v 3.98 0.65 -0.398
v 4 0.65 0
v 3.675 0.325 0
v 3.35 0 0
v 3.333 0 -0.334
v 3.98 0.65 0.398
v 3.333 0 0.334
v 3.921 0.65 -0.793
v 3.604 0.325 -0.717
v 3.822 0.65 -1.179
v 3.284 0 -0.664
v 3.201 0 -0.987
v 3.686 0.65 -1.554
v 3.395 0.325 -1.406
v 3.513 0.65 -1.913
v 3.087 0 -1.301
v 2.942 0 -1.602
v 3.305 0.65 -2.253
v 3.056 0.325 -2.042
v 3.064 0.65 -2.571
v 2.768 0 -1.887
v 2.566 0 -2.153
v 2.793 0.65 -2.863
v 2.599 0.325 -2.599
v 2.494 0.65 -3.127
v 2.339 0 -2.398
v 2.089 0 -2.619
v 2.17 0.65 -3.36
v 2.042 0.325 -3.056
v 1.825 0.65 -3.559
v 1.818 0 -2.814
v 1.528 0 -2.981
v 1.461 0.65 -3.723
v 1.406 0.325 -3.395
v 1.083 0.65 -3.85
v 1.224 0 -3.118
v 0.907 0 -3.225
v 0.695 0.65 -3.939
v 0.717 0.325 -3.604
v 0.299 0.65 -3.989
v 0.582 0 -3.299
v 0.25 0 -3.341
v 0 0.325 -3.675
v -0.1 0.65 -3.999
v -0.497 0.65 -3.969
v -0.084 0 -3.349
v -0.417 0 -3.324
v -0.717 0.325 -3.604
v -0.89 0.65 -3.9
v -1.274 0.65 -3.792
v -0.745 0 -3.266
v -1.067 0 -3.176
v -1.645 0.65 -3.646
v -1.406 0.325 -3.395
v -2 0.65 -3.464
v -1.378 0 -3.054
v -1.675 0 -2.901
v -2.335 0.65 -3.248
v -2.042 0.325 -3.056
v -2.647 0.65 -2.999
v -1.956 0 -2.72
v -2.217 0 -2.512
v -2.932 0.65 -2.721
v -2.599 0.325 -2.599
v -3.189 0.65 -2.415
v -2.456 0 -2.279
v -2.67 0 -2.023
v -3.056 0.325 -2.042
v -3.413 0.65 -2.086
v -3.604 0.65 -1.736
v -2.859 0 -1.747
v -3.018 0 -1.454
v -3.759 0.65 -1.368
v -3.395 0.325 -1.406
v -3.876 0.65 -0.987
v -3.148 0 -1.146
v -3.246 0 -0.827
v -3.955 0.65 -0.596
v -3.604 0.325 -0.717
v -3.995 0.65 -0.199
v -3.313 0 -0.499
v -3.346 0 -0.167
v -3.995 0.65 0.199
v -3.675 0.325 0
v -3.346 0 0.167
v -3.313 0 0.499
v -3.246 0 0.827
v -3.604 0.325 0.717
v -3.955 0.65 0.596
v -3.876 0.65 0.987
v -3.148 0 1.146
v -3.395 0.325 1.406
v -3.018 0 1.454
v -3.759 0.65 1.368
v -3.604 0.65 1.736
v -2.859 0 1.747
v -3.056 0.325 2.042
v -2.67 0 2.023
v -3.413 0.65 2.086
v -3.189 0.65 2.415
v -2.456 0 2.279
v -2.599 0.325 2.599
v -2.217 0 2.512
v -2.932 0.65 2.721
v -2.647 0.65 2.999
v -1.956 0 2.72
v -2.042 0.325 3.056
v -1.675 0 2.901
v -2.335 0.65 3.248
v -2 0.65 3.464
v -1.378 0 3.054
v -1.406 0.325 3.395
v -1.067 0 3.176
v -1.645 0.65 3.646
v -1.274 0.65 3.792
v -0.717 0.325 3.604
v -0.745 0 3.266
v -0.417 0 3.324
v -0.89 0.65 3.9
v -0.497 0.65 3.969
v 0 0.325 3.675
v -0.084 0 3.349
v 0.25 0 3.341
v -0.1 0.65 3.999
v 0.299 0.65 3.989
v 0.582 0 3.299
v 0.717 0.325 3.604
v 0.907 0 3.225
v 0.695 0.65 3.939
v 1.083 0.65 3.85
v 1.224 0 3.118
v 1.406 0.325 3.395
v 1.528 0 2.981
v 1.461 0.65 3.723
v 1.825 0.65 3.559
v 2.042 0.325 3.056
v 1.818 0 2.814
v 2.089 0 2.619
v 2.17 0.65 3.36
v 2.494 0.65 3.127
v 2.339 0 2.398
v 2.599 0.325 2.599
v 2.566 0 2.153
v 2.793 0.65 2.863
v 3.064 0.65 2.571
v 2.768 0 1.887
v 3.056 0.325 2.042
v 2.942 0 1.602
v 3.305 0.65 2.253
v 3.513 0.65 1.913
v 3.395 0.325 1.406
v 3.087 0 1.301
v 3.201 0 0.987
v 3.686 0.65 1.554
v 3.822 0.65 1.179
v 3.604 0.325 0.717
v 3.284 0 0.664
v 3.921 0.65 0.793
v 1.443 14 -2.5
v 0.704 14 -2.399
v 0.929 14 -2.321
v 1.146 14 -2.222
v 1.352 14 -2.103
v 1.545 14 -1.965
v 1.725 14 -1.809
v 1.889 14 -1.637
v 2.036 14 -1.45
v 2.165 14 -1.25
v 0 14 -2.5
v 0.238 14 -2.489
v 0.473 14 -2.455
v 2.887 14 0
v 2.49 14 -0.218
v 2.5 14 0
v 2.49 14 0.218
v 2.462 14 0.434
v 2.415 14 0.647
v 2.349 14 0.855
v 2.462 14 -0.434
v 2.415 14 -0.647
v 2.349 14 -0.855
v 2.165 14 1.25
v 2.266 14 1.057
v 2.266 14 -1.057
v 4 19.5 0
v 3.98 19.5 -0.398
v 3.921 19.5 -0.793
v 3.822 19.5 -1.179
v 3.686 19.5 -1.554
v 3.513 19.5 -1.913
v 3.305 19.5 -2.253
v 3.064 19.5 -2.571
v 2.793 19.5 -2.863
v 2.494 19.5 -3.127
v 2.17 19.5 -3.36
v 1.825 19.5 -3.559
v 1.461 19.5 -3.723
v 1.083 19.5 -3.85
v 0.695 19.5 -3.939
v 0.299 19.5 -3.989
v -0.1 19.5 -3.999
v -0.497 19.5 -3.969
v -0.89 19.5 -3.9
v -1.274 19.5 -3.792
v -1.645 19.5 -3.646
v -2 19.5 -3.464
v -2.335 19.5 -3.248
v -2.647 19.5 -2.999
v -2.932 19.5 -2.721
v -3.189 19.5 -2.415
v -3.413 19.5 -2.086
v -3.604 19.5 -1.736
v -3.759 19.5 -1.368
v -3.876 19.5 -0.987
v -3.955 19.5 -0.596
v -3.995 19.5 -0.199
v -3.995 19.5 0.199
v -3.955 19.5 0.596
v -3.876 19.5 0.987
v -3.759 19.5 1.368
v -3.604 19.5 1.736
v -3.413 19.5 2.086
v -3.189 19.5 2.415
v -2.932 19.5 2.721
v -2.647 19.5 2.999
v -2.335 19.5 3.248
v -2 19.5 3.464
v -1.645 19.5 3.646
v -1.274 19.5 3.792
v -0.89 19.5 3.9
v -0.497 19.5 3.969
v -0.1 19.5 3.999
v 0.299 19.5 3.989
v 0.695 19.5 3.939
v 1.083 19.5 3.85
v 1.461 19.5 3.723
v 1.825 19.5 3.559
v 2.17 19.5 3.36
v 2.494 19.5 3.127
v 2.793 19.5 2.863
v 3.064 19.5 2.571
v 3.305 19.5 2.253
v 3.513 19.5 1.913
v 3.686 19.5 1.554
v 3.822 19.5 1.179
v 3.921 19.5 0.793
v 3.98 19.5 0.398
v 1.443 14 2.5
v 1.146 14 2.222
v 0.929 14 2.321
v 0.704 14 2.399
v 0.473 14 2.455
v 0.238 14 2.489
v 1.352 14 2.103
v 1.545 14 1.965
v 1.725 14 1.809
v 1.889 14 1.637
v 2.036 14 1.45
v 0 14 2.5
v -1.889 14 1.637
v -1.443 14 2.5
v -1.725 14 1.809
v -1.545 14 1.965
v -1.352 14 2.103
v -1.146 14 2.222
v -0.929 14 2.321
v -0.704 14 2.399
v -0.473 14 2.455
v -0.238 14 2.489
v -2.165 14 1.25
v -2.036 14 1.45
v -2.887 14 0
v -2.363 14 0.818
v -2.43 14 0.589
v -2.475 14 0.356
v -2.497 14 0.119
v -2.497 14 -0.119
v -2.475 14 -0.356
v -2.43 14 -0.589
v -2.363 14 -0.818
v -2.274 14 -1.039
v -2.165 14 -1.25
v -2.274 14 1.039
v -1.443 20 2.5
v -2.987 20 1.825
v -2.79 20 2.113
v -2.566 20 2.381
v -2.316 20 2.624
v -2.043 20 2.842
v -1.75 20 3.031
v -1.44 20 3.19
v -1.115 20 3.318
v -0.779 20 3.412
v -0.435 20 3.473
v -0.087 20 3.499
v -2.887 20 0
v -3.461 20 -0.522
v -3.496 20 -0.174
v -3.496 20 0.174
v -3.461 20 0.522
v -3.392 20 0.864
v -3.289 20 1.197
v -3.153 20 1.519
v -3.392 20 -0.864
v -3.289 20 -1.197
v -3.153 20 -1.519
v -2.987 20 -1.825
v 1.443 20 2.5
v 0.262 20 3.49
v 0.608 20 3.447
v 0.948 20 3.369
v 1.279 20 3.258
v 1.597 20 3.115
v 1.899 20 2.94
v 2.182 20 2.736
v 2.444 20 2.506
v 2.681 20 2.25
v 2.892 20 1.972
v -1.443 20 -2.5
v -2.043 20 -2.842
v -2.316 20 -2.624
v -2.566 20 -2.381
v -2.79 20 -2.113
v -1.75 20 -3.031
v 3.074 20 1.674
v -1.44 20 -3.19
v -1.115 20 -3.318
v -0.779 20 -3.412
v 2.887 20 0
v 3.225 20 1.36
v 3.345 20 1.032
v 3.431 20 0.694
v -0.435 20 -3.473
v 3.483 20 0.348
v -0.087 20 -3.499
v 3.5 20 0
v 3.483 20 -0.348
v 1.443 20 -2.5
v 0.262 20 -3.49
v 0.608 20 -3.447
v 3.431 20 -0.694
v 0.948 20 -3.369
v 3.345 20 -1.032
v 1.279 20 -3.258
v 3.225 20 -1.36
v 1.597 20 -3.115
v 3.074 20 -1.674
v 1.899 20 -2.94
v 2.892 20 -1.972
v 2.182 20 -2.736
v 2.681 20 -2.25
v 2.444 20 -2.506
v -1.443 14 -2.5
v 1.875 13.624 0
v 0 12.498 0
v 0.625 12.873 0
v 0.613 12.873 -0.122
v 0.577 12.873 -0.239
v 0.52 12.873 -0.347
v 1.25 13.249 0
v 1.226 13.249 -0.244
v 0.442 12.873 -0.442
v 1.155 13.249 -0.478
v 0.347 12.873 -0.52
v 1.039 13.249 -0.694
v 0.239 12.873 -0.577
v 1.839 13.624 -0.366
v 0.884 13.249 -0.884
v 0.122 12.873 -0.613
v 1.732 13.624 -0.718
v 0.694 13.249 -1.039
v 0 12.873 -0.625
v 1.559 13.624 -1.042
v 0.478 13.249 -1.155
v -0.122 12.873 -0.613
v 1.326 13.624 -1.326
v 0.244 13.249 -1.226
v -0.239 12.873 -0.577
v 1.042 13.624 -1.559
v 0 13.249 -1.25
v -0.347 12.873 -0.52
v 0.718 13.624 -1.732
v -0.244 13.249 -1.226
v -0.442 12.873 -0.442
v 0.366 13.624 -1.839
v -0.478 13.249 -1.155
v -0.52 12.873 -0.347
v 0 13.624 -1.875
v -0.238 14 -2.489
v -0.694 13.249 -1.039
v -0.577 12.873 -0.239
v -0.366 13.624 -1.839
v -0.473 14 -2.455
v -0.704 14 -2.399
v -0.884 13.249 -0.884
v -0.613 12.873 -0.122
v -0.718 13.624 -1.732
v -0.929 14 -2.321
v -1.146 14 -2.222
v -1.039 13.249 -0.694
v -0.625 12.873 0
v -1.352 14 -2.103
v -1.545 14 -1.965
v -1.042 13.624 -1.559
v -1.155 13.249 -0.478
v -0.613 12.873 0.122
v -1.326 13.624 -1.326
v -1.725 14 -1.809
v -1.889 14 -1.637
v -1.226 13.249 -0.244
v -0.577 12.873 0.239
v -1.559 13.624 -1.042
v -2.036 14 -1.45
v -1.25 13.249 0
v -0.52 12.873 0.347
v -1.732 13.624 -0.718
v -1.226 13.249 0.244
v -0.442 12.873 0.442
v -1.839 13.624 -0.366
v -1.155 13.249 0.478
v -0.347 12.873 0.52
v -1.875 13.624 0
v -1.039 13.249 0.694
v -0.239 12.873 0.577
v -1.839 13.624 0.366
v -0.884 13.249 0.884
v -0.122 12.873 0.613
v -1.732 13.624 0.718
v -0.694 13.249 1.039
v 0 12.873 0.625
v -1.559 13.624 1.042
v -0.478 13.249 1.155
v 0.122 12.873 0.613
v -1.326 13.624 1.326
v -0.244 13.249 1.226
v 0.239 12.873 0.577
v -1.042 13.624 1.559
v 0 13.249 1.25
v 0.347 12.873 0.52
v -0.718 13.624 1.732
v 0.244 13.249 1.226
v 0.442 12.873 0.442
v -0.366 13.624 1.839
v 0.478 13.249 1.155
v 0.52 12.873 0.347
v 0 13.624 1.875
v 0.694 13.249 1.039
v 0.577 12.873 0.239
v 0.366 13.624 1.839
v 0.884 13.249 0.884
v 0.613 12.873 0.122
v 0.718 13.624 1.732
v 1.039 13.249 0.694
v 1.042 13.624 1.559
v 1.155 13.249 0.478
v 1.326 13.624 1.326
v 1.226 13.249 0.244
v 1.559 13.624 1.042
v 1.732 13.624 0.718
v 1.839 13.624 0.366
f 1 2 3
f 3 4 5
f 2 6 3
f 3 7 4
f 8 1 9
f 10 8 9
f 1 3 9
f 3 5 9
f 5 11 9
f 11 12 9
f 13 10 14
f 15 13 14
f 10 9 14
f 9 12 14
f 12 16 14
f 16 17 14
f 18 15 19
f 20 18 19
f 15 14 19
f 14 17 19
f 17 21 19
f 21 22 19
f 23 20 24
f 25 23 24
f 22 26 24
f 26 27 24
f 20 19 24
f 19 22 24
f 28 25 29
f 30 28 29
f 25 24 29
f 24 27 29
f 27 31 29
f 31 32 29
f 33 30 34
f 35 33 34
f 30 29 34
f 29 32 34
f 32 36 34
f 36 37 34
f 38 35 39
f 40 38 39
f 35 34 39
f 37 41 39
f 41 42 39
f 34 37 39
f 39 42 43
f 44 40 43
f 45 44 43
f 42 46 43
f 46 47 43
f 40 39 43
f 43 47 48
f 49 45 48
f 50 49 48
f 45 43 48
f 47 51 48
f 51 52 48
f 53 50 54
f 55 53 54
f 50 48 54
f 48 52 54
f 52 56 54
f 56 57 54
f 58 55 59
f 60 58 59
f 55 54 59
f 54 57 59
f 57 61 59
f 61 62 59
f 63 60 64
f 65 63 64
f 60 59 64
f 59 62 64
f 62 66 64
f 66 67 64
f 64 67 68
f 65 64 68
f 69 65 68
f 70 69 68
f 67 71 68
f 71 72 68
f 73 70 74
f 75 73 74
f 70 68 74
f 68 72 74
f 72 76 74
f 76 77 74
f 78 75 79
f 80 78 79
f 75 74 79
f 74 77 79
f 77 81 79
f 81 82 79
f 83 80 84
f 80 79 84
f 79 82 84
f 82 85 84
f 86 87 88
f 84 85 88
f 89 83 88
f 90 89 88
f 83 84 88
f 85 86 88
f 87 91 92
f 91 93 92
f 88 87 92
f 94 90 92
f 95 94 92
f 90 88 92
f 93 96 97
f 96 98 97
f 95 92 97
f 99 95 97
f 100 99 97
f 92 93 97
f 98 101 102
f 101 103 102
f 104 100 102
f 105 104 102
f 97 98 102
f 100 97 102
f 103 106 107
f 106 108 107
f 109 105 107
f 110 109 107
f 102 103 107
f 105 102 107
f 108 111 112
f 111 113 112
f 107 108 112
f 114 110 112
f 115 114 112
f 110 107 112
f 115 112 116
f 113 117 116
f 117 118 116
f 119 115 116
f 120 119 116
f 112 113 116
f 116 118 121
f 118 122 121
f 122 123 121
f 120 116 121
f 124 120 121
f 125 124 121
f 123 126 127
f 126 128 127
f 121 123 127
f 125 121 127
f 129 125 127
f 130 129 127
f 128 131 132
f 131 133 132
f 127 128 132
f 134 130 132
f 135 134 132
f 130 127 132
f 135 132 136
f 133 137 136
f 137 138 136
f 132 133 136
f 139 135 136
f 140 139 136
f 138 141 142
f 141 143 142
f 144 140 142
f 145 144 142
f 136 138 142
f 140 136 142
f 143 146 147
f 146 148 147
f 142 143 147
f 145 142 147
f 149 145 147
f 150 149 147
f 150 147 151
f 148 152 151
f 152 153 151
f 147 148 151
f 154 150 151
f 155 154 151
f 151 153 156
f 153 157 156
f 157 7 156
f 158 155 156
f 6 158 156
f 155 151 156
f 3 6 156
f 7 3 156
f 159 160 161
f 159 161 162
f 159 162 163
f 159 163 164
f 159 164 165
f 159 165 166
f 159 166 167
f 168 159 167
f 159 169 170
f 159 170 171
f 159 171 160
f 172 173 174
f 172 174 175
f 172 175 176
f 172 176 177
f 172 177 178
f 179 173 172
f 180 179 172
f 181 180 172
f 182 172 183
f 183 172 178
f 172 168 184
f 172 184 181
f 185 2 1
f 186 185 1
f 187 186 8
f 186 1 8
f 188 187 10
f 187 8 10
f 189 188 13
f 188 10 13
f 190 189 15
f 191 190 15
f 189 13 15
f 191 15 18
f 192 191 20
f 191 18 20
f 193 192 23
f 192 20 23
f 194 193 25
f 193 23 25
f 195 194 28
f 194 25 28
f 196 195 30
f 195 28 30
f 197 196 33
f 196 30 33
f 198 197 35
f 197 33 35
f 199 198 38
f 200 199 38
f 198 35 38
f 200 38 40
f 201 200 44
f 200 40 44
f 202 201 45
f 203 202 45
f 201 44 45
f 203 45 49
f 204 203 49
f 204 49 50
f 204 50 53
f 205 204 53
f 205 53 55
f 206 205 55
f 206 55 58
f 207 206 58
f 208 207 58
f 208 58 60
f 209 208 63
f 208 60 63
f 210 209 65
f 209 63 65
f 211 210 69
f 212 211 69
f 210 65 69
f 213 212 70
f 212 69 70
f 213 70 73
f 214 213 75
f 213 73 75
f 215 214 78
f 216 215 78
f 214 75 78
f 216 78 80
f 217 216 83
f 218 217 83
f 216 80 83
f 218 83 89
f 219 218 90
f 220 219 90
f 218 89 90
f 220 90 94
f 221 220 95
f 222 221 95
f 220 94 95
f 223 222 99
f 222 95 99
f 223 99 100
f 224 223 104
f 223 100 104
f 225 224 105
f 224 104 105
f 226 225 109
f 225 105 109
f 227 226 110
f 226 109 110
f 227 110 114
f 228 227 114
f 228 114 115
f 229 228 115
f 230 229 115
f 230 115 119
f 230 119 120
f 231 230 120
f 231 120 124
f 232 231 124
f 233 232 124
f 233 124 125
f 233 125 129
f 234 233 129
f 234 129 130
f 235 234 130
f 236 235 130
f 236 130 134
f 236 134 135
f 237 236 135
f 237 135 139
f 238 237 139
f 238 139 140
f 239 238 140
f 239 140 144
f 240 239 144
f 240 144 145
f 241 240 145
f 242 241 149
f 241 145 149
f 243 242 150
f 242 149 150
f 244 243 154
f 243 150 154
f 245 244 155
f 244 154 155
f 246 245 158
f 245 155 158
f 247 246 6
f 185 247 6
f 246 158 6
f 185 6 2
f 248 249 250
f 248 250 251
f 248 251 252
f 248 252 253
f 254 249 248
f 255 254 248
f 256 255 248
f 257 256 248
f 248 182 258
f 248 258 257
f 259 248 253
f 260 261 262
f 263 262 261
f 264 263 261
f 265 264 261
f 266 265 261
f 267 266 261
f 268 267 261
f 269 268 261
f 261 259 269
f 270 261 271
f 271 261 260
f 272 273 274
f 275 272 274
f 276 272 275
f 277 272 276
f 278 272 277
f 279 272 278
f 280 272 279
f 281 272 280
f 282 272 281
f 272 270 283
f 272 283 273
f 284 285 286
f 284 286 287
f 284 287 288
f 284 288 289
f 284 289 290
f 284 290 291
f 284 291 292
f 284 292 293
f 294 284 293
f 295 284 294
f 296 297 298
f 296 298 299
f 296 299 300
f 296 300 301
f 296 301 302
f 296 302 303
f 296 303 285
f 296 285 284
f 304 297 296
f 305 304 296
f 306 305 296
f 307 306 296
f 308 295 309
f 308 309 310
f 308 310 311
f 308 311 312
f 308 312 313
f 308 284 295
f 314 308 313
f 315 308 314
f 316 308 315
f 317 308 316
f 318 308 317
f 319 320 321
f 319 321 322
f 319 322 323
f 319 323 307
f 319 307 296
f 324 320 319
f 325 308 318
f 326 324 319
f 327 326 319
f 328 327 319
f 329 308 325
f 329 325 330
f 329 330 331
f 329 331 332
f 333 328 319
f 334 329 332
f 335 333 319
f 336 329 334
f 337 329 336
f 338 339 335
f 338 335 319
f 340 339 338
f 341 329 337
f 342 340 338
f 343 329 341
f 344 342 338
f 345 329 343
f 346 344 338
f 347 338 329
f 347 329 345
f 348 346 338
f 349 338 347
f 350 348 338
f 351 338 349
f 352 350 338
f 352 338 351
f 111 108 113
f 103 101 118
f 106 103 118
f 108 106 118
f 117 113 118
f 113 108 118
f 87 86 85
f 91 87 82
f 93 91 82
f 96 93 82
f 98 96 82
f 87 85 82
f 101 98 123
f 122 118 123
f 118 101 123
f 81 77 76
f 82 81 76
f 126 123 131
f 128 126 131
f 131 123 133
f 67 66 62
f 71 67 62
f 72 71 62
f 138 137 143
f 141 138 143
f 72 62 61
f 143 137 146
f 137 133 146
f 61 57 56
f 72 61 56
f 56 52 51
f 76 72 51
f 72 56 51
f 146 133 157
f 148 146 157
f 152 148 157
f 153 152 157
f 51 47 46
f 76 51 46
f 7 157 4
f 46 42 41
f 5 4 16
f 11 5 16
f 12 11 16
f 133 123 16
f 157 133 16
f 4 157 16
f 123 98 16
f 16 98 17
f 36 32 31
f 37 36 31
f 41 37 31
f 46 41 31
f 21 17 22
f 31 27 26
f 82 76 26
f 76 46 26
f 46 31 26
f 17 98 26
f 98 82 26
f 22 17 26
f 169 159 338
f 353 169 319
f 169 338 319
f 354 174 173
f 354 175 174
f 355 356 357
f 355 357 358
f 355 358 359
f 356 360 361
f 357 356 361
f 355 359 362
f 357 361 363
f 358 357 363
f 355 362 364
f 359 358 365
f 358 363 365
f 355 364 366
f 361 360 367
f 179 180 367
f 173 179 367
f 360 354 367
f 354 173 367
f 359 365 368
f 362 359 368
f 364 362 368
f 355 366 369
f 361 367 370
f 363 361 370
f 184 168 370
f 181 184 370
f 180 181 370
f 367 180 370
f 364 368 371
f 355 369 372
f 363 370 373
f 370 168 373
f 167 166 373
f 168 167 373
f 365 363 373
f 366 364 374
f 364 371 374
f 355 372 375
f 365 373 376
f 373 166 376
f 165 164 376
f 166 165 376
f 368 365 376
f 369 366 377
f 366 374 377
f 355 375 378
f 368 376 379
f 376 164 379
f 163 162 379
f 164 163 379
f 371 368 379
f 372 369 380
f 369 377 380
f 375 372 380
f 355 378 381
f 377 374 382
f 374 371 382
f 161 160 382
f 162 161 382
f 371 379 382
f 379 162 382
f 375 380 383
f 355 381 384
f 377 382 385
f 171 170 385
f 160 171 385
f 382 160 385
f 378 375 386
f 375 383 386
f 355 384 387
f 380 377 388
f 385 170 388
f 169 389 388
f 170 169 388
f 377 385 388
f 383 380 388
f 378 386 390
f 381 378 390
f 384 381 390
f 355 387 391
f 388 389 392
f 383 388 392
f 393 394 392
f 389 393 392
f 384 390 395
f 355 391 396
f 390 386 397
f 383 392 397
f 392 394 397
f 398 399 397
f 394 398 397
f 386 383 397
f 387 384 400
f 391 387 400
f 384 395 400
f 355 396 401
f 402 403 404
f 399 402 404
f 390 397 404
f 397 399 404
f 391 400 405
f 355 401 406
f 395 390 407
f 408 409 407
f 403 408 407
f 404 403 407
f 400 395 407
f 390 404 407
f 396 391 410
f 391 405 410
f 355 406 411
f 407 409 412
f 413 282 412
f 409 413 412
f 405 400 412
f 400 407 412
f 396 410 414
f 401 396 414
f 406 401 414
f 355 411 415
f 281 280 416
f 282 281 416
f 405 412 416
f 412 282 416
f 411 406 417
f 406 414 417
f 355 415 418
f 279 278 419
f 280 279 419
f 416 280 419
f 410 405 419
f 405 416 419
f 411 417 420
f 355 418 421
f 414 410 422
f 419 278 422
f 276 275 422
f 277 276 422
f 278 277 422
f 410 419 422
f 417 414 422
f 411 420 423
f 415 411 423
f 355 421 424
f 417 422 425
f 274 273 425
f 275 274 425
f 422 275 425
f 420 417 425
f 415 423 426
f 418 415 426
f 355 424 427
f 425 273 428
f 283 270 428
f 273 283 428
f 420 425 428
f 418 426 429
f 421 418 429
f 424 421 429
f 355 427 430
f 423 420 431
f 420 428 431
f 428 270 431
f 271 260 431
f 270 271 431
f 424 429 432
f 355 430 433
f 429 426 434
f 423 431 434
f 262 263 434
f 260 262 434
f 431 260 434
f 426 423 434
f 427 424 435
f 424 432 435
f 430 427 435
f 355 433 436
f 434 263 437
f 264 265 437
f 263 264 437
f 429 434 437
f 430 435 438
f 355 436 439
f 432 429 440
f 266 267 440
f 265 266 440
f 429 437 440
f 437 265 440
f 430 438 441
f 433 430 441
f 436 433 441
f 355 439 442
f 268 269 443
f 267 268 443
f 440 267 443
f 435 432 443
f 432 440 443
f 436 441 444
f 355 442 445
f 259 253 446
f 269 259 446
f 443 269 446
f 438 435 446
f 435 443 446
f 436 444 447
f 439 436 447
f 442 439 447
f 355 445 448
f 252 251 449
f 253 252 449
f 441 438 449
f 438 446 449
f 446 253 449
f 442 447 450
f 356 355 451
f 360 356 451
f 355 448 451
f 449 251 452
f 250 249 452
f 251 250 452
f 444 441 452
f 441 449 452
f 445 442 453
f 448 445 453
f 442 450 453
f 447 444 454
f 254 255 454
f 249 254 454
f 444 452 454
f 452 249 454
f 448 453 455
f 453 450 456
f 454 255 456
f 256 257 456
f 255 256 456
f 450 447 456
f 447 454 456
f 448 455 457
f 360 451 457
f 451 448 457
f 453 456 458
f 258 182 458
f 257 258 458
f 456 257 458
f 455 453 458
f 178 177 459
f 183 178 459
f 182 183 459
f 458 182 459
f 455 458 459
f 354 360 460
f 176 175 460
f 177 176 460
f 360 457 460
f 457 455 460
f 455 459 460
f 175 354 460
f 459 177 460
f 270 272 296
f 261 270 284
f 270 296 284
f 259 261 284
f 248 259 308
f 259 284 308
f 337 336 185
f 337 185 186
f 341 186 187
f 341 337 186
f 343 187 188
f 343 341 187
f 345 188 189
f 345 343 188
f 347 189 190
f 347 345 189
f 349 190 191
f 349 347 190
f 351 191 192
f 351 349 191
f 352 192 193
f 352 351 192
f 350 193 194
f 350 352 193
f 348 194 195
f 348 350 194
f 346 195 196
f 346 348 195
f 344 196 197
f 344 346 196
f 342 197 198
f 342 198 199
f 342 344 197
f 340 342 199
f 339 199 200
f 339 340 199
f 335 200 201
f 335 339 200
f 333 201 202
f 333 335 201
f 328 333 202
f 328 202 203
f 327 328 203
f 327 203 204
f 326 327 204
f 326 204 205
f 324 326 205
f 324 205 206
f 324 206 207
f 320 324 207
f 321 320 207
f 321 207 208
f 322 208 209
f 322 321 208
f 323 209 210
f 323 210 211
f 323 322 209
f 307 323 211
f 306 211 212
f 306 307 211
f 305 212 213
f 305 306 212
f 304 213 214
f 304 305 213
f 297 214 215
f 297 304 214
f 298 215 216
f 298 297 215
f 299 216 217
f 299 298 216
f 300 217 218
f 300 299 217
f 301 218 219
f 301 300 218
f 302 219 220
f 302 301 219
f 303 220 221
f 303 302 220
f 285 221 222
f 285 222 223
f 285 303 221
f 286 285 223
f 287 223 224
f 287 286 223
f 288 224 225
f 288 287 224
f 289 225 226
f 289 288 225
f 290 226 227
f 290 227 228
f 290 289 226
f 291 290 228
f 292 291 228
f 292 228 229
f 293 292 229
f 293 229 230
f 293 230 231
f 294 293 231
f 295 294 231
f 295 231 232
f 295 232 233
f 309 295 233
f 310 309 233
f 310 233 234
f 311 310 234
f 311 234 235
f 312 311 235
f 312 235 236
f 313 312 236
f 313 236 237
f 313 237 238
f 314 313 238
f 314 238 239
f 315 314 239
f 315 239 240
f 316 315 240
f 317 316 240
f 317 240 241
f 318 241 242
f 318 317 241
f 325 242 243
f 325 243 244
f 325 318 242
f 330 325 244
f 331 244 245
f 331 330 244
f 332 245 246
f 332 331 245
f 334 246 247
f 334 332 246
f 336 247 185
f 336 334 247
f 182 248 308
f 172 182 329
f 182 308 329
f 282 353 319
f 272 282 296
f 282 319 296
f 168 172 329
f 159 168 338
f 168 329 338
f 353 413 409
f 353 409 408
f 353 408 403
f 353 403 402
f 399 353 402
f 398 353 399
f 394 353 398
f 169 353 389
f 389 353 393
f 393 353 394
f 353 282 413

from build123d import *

# Parameters (mm, degrees)
SKETCH1_R                 = 4
BOSS_EXTRUDE1_DEPTH       = 20
F_5_0MM_DOWEL_HOLE1_D     = 5
F_5_0MM_DOWEL_HOLE1_DEPTH = 6
F_5_0MM_DOWEL_HOLE1_TIP   = 1.502151548
CUT_EXTRUDE1_DEPTH        = 6
CHAMFER1_SIZE             = 0.5
CHAMFER2_SIZE             = 0.65


with BuildPart() as part:
    # Sketch1 → Boss-Extrude1 (new body)
    with BuildSketch(Plane(origin=(0, 0, 0), x_dir=(1, 0, 0), z_dir=(0, 1, 0))):
        Circle(SKETCH1_R)
    extrude(amount=BOSS_EXTRUDE1_DEPTH)

    # Ø5.0mm Dowel Hole1
    with Locations(Plane(origin=(0, 20, 0), x_dir=(1, 0, 0), z_dir=(0, 1, 0))):
        with Locations((0, 0)):
            Hole(F_5_0MM_DOWEL_HOLE1_D / 2, depth=F_5_0MM_DOWEL_HOLE1_DEPTH)
            with Locations((0, 0, -(F_5_0MM_DOWEL_HOLE1_DEPTH + F_5_0MM_DOWEL_HOLE1_TIP / 2))):  # 118° drill point
                Cone(0, F_5_0MM_DOWEL_HOLE1_D / 2, F_5_0MM_DOWEL_HOLE1_TIP, mode=Mode.SUBTRACT)

    # Sketch2 → Cut-Extrude1 (cut)
    with BuildSketch(Plane(origin=(0, 20, 0), x_dir=(1, 0, 0), z_dir=(0, 1, 0))):
        Polygon((2.886751346, 0), (1.443375673, 2.5), (-1.443375673, 2.5), (-2.886751346, 0), (-1.443375673, -2.5), (1.443375673, -2.5), align=None)
    extrude(amount=-CUT_EXTRUDE1_DEPTH, mode=Mode.SUBTRACT)

    # Chamfer1
    chamfer1_edges = [part.edges().sort_by_distance(p)[0] for p in [
        (-4, 20, 0),
    ]]
    chamfer(chamfer1_edges, length=CHAMFER1_SIZE)

    # Chamfer2
    chamfer2_edges = [part.edges().sort_by_distance(p)[0] for p in [
        (-4, 0, 0),
    ]]
    chamfer(chamfer2_edges, length=CHAMFER2_SIZE)


solid = part.part
